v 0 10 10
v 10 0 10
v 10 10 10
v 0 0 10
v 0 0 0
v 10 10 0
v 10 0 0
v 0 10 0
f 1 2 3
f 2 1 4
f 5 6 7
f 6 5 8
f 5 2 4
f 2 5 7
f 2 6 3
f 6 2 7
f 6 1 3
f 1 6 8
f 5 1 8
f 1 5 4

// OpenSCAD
/*
This module defines a cube that has holes on its faces.  This is meant to be used to create structures with a controllable amount of holes.  The idea is that you specify a hole radius/spacing and the module makes a prism that has the appropriate number of holes and spacing.
@param inputCubeDimensions: A 3 element array defining the length, width and breadth of the prism
@param inputHoleDiameter: The diameter of the holes to put in the cube
@param inputHoleSpacing: The center to center distance between adjacent holes in the cube
@param inputDirectionToPutHoles: A 3 element array defining which of the axises should have holes (a 1 indicates that holes should be placed) 
*/

module cubeWithHoles(inputCubeDimensions, inputHoleDiameter = 1, inputHoleSpacing = 2, inputDirectionToPutHoles = [1,1,1])
{
cube(inputCubeDimensions);

//For each of the defined axises, insert the required
counter = 0;
for(i = [0:2])
{

if(inputDirectionToPutHoles[i] == 1)
{
//Put in the holes for this axis (xy, yz, zx)
testThisThing = i % 3.0;
testThisThing2 = inputCubeDimensions[(i+1) % 3];
twoDDimensions = [inputCubeDimensions[counter%3], inputCubeDimensions[(counter+1)%3]];


//Determine how many holes in the two dimensions
//numberOfHoles = [floor(twoDimensions[0]/inputCubeDimensions)-1, floor(twoDimensions[0]/inputCubeDimensions)-1)];


}

}

}

cubeWithHoles([10, 10, 10]);
